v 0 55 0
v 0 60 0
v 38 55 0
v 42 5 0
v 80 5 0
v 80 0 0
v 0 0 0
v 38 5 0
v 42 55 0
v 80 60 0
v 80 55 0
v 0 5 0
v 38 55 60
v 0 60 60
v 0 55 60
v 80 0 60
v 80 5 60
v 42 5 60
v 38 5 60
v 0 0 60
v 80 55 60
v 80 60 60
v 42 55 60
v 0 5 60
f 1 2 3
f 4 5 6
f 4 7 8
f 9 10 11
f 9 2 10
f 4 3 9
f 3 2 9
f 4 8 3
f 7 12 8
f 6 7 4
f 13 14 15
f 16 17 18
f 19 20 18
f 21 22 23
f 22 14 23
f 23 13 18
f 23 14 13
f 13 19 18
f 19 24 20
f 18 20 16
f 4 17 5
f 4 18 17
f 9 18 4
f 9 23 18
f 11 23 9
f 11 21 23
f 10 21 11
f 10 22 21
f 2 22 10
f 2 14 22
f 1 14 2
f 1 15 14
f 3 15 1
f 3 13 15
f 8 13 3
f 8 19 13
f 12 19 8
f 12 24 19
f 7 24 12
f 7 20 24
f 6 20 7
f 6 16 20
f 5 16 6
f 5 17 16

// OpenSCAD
$fn = 32;

// ----------------------------------------------------------------------
// Structural section: ibeam 80 x 60 mm
// ----------------------------------------------------------------------

// --- parameters (mm) ---
sec_w = 80;               // section width, X
sec_h = 60;               // section height, Y
flange_t = 5;             // flange thickness
web_t = 4;                // web thickness
plate_t = 60;             // cut length, Z (extrusion height)
fit_tol = 0.1;            // declared fit tolerance (prompt contract)
free_tol = 0.5;           // declared free tolerance (prompt contract)

profile = [[0, 0], [80, 0], [80, 5], [42, 5], [42, 55], [80, 55], [80, 60], [0, 60], [0, 55], [38, 55], [38, 5], [0, 5]];  // primary outline, 12 points, counter clockwise

// --- the one profile operation ---
linear_extrude(height = plate_t) polygon(points = profile);
